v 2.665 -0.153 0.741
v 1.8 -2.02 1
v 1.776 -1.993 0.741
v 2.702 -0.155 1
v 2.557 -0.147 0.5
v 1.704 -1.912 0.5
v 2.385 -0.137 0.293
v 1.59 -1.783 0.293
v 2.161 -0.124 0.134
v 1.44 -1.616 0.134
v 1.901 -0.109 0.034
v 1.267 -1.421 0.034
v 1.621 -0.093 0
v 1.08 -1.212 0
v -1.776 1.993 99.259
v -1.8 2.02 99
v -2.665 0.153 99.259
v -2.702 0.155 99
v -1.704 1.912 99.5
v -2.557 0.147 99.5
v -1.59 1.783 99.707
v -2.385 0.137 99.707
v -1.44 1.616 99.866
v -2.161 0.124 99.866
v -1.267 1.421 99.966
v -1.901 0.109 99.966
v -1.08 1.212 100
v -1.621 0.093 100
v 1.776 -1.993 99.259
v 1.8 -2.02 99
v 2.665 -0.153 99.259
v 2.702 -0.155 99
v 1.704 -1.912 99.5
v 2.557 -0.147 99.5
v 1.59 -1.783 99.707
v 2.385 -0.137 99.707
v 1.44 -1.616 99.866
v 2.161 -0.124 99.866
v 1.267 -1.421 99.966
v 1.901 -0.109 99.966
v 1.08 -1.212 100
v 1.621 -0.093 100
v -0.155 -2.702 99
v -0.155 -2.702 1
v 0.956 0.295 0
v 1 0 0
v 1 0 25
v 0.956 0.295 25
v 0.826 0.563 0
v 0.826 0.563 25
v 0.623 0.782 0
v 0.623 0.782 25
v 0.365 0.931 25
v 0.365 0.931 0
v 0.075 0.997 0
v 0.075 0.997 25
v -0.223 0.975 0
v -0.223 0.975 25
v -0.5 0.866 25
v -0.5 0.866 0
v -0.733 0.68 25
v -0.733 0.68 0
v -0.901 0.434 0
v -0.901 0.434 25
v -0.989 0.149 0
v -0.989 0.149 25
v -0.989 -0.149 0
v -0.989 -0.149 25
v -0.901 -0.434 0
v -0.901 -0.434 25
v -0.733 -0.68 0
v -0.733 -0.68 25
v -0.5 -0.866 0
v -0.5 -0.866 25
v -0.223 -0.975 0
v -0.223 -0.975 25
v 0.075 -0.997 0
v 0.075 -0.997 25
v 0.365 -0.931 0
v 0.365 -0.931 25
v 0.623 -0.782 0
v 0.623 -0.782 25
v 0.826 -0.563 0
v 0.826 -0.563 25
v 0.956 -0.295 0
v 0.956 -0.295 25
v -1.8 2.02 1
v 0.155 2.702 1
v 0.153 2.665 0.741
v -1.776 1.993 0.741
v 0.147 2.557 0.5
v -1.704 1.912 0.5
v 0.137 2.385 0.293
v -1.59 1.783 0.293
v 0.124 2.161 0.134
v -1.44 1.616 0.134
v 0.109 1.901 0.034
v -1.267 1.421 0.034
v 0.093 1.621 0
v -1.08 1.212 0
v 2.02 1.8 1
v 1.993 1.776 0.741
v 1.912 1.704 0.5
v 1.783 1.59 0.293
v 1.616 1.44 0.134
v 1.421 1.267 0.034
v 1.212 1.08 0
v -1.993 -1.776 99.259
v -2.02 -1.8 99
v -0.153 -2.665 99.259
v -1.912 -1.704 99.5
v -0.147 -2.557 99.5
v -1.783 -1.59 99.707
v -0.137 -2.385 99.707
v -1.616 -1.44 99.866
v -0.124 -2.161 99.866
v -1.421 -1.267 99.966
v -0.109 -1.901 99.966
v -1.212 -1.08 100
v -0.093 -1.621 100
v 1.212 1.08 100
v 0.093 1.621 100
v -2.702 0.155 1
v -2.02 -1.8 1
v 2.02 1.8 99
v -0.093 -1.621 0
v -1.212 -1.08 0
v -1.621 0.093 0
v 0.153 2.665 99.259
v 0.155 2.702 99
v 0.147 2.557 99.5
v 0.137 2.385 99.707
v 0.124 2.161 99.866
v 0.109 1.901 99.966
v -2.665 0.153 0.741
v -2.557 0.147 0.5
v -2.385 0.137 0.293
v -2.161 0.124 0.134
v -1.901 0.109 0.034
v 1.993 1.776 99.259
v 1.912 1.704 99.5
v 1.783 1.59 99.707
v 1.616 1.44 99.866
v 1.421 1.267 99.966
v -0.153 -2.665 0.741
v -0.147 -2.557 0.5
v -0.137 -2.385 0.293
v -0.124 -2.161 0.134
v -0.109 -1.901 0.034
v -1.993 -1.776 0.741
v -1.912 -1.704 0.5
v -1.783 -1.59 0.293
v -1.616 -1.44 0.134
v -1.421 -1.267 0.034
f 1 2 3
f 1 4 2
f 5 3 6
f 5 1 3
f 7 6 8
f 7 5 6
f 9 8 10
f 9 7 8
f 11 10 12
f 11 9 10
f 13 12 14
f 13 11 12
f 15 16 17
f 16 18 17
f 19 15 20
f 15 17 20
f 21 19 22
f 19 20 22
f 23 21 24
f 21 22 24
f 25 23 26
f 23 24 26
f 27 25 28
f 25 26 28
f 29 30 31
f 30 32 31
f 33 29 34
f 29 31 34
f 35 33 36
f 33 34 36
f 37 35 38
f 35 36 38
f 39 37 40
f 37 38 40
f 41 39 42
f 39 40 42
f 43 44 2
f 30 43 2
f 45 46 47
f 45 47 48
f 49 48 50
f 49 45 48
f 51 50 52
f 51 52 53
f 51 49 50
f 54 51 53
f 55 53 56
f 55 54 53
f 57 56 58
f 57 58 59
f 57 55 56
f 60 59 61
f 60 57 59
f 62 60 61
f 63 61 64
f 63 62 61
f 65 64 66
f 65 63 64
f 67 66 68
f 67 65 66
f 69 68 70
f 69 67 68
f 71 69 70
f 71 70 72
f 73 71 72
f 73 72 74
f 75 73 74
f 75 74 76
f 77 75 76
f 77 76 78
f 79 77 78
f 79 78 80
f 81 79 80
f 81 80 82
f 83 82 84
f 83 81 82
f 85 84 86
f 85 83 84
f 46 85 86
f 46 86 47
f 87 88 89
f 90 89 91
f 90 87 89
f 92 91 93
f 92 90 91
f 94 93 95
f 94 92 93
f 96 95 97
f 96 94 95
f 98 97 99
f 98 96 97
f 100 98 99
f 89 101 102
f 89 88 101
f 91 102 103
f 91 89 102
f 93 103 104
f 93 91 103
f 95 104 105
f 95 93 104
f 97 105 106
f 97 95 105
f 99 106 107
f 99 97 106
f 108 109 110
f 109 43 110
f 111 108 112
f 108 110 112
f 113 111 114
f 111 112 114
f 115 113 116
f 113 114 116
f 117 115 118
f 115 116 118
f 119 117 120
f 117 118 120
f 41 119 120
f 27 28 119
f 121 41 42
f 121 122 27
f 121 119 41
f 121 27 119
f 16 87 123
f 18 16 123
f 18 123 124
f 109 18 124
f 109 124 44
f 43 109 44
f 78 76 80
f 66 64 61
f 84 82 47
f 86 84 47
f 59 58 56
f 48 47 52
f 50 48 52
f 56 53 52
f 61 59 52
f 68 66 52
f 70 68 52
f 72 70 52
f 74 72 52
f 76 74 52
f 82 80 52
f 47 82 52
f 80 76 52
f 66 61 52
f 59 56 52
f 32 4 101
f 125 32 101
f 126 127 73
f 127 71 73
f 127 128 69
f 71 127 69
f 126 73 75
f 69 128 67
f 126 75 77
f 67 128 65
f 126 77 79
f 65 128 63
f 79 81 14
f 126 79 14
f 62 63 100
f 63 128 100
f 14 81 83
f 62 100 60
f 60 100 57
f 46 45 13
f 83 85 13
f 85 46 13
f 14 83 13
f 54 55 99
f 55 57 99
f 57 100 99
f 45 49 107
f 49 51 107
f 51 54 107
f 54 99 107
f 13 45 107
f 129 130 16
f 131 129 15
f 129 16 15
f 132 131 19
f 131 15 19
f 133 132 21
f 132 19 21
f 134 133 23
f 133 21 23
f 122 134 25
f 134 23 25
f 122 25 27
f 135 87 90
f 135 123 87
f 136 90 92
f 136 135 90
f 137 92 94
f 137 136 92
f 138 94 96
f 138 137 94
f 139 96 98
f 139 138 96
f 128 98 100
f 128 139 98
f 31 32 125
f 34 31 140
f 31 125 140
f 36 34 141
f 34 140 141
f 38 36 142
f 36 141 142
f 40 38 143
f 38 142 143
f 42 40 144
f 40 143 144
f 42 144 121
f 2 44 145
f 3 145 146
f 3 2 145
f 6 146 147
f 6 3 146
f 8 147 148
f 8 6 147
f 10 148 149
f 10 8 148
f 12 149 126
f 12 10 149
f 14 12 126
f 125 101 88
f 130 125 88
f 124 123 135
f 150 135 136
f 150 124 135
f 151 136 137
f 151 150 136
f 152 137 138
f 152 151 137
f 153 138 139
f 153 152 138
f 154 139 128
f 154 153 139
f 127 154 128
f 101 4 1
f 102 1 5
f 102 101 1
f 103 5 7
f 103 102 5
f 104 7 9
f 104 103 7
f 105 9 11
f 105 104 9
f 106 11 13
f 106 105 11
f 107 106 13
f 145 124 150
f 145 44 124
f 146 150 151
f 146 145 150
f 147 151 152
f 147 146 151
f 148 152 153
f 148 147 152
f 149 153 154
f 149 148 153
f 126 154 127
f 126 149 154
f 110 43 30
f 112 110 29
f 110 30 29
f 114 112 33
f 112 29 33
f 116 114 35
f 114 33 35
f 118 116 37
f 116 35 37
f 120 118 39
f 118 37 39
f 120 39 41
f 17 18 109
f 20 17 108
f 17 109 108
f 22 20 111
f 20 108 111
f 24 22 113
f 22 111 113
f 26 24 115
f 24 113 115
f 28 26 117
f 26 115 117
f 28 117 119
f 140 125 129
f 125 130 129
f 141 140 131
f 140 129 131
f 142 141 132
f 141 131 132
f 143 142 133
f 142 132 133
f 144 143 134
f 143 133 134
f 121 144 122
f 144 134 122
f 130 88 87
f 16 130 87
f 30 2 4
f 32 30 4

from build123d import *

# Parameters (mm, degrees)
F0_R     = 1
F1_DEPTH = 100
F2_R     = 1
F3_DEPTH = 25


with BuildPart() as f1:
    # F0 (on Top) → F1 (new body)
    with BuildSketch(Plane.XY):
        Polygon((2.701523, -0.15526), (2.02005, 1.80048), (0.15526, 2.701523), (-1.80048, 2.02005), (-2.701523, 0.15526), (-2.02005, -1.80048), (-0.15526, -2.701523), (1.80048, -2.02005), align=None)
        Circle(F0_R, mode=Mode.SUBTRACT)
        Circle(F0_R)
    extrude(amount=F1_DEPTH)

    # F2
    f2_edges = [f1.edges().sort_by_distance(p)[0] for p in [
        (0.82261, -2.360787, 0),
        (2.251001, -1.087655, 0),
        (2.360787, 0.82261, 0),
        (1.087655, 2.251001, 0),
        (-0.82261, 2.360787, 0),
        (-2.251001, 1.087655, 0),
        (-2.360787, -0.82261, 0),
        (-1.087655, -2.251001, 0),
        (0.82261, -2.360787, 100),
        (2.251001, -1.087655, 100),
        (2.360787, 0.82261, 100),
        (1.087655, 2.251001, 100),
        (-0.82261, 2.360787, 100),
        (-2.251001, 1.087655, 100),
        (-2.360787, -0.82261, 100),
        (-1.087655, -2.251001, 100),
    ]]
    fillet(f2_edges, radius=F2_R)

    # F0 (on Top) → F3 (cut)
    with BuildSketch(Plane.XY):
        Circle(F0_R)
    extrude(amount=F3_DEPTH, mode=Mode.SUBTRACT)


solid = f1.part
